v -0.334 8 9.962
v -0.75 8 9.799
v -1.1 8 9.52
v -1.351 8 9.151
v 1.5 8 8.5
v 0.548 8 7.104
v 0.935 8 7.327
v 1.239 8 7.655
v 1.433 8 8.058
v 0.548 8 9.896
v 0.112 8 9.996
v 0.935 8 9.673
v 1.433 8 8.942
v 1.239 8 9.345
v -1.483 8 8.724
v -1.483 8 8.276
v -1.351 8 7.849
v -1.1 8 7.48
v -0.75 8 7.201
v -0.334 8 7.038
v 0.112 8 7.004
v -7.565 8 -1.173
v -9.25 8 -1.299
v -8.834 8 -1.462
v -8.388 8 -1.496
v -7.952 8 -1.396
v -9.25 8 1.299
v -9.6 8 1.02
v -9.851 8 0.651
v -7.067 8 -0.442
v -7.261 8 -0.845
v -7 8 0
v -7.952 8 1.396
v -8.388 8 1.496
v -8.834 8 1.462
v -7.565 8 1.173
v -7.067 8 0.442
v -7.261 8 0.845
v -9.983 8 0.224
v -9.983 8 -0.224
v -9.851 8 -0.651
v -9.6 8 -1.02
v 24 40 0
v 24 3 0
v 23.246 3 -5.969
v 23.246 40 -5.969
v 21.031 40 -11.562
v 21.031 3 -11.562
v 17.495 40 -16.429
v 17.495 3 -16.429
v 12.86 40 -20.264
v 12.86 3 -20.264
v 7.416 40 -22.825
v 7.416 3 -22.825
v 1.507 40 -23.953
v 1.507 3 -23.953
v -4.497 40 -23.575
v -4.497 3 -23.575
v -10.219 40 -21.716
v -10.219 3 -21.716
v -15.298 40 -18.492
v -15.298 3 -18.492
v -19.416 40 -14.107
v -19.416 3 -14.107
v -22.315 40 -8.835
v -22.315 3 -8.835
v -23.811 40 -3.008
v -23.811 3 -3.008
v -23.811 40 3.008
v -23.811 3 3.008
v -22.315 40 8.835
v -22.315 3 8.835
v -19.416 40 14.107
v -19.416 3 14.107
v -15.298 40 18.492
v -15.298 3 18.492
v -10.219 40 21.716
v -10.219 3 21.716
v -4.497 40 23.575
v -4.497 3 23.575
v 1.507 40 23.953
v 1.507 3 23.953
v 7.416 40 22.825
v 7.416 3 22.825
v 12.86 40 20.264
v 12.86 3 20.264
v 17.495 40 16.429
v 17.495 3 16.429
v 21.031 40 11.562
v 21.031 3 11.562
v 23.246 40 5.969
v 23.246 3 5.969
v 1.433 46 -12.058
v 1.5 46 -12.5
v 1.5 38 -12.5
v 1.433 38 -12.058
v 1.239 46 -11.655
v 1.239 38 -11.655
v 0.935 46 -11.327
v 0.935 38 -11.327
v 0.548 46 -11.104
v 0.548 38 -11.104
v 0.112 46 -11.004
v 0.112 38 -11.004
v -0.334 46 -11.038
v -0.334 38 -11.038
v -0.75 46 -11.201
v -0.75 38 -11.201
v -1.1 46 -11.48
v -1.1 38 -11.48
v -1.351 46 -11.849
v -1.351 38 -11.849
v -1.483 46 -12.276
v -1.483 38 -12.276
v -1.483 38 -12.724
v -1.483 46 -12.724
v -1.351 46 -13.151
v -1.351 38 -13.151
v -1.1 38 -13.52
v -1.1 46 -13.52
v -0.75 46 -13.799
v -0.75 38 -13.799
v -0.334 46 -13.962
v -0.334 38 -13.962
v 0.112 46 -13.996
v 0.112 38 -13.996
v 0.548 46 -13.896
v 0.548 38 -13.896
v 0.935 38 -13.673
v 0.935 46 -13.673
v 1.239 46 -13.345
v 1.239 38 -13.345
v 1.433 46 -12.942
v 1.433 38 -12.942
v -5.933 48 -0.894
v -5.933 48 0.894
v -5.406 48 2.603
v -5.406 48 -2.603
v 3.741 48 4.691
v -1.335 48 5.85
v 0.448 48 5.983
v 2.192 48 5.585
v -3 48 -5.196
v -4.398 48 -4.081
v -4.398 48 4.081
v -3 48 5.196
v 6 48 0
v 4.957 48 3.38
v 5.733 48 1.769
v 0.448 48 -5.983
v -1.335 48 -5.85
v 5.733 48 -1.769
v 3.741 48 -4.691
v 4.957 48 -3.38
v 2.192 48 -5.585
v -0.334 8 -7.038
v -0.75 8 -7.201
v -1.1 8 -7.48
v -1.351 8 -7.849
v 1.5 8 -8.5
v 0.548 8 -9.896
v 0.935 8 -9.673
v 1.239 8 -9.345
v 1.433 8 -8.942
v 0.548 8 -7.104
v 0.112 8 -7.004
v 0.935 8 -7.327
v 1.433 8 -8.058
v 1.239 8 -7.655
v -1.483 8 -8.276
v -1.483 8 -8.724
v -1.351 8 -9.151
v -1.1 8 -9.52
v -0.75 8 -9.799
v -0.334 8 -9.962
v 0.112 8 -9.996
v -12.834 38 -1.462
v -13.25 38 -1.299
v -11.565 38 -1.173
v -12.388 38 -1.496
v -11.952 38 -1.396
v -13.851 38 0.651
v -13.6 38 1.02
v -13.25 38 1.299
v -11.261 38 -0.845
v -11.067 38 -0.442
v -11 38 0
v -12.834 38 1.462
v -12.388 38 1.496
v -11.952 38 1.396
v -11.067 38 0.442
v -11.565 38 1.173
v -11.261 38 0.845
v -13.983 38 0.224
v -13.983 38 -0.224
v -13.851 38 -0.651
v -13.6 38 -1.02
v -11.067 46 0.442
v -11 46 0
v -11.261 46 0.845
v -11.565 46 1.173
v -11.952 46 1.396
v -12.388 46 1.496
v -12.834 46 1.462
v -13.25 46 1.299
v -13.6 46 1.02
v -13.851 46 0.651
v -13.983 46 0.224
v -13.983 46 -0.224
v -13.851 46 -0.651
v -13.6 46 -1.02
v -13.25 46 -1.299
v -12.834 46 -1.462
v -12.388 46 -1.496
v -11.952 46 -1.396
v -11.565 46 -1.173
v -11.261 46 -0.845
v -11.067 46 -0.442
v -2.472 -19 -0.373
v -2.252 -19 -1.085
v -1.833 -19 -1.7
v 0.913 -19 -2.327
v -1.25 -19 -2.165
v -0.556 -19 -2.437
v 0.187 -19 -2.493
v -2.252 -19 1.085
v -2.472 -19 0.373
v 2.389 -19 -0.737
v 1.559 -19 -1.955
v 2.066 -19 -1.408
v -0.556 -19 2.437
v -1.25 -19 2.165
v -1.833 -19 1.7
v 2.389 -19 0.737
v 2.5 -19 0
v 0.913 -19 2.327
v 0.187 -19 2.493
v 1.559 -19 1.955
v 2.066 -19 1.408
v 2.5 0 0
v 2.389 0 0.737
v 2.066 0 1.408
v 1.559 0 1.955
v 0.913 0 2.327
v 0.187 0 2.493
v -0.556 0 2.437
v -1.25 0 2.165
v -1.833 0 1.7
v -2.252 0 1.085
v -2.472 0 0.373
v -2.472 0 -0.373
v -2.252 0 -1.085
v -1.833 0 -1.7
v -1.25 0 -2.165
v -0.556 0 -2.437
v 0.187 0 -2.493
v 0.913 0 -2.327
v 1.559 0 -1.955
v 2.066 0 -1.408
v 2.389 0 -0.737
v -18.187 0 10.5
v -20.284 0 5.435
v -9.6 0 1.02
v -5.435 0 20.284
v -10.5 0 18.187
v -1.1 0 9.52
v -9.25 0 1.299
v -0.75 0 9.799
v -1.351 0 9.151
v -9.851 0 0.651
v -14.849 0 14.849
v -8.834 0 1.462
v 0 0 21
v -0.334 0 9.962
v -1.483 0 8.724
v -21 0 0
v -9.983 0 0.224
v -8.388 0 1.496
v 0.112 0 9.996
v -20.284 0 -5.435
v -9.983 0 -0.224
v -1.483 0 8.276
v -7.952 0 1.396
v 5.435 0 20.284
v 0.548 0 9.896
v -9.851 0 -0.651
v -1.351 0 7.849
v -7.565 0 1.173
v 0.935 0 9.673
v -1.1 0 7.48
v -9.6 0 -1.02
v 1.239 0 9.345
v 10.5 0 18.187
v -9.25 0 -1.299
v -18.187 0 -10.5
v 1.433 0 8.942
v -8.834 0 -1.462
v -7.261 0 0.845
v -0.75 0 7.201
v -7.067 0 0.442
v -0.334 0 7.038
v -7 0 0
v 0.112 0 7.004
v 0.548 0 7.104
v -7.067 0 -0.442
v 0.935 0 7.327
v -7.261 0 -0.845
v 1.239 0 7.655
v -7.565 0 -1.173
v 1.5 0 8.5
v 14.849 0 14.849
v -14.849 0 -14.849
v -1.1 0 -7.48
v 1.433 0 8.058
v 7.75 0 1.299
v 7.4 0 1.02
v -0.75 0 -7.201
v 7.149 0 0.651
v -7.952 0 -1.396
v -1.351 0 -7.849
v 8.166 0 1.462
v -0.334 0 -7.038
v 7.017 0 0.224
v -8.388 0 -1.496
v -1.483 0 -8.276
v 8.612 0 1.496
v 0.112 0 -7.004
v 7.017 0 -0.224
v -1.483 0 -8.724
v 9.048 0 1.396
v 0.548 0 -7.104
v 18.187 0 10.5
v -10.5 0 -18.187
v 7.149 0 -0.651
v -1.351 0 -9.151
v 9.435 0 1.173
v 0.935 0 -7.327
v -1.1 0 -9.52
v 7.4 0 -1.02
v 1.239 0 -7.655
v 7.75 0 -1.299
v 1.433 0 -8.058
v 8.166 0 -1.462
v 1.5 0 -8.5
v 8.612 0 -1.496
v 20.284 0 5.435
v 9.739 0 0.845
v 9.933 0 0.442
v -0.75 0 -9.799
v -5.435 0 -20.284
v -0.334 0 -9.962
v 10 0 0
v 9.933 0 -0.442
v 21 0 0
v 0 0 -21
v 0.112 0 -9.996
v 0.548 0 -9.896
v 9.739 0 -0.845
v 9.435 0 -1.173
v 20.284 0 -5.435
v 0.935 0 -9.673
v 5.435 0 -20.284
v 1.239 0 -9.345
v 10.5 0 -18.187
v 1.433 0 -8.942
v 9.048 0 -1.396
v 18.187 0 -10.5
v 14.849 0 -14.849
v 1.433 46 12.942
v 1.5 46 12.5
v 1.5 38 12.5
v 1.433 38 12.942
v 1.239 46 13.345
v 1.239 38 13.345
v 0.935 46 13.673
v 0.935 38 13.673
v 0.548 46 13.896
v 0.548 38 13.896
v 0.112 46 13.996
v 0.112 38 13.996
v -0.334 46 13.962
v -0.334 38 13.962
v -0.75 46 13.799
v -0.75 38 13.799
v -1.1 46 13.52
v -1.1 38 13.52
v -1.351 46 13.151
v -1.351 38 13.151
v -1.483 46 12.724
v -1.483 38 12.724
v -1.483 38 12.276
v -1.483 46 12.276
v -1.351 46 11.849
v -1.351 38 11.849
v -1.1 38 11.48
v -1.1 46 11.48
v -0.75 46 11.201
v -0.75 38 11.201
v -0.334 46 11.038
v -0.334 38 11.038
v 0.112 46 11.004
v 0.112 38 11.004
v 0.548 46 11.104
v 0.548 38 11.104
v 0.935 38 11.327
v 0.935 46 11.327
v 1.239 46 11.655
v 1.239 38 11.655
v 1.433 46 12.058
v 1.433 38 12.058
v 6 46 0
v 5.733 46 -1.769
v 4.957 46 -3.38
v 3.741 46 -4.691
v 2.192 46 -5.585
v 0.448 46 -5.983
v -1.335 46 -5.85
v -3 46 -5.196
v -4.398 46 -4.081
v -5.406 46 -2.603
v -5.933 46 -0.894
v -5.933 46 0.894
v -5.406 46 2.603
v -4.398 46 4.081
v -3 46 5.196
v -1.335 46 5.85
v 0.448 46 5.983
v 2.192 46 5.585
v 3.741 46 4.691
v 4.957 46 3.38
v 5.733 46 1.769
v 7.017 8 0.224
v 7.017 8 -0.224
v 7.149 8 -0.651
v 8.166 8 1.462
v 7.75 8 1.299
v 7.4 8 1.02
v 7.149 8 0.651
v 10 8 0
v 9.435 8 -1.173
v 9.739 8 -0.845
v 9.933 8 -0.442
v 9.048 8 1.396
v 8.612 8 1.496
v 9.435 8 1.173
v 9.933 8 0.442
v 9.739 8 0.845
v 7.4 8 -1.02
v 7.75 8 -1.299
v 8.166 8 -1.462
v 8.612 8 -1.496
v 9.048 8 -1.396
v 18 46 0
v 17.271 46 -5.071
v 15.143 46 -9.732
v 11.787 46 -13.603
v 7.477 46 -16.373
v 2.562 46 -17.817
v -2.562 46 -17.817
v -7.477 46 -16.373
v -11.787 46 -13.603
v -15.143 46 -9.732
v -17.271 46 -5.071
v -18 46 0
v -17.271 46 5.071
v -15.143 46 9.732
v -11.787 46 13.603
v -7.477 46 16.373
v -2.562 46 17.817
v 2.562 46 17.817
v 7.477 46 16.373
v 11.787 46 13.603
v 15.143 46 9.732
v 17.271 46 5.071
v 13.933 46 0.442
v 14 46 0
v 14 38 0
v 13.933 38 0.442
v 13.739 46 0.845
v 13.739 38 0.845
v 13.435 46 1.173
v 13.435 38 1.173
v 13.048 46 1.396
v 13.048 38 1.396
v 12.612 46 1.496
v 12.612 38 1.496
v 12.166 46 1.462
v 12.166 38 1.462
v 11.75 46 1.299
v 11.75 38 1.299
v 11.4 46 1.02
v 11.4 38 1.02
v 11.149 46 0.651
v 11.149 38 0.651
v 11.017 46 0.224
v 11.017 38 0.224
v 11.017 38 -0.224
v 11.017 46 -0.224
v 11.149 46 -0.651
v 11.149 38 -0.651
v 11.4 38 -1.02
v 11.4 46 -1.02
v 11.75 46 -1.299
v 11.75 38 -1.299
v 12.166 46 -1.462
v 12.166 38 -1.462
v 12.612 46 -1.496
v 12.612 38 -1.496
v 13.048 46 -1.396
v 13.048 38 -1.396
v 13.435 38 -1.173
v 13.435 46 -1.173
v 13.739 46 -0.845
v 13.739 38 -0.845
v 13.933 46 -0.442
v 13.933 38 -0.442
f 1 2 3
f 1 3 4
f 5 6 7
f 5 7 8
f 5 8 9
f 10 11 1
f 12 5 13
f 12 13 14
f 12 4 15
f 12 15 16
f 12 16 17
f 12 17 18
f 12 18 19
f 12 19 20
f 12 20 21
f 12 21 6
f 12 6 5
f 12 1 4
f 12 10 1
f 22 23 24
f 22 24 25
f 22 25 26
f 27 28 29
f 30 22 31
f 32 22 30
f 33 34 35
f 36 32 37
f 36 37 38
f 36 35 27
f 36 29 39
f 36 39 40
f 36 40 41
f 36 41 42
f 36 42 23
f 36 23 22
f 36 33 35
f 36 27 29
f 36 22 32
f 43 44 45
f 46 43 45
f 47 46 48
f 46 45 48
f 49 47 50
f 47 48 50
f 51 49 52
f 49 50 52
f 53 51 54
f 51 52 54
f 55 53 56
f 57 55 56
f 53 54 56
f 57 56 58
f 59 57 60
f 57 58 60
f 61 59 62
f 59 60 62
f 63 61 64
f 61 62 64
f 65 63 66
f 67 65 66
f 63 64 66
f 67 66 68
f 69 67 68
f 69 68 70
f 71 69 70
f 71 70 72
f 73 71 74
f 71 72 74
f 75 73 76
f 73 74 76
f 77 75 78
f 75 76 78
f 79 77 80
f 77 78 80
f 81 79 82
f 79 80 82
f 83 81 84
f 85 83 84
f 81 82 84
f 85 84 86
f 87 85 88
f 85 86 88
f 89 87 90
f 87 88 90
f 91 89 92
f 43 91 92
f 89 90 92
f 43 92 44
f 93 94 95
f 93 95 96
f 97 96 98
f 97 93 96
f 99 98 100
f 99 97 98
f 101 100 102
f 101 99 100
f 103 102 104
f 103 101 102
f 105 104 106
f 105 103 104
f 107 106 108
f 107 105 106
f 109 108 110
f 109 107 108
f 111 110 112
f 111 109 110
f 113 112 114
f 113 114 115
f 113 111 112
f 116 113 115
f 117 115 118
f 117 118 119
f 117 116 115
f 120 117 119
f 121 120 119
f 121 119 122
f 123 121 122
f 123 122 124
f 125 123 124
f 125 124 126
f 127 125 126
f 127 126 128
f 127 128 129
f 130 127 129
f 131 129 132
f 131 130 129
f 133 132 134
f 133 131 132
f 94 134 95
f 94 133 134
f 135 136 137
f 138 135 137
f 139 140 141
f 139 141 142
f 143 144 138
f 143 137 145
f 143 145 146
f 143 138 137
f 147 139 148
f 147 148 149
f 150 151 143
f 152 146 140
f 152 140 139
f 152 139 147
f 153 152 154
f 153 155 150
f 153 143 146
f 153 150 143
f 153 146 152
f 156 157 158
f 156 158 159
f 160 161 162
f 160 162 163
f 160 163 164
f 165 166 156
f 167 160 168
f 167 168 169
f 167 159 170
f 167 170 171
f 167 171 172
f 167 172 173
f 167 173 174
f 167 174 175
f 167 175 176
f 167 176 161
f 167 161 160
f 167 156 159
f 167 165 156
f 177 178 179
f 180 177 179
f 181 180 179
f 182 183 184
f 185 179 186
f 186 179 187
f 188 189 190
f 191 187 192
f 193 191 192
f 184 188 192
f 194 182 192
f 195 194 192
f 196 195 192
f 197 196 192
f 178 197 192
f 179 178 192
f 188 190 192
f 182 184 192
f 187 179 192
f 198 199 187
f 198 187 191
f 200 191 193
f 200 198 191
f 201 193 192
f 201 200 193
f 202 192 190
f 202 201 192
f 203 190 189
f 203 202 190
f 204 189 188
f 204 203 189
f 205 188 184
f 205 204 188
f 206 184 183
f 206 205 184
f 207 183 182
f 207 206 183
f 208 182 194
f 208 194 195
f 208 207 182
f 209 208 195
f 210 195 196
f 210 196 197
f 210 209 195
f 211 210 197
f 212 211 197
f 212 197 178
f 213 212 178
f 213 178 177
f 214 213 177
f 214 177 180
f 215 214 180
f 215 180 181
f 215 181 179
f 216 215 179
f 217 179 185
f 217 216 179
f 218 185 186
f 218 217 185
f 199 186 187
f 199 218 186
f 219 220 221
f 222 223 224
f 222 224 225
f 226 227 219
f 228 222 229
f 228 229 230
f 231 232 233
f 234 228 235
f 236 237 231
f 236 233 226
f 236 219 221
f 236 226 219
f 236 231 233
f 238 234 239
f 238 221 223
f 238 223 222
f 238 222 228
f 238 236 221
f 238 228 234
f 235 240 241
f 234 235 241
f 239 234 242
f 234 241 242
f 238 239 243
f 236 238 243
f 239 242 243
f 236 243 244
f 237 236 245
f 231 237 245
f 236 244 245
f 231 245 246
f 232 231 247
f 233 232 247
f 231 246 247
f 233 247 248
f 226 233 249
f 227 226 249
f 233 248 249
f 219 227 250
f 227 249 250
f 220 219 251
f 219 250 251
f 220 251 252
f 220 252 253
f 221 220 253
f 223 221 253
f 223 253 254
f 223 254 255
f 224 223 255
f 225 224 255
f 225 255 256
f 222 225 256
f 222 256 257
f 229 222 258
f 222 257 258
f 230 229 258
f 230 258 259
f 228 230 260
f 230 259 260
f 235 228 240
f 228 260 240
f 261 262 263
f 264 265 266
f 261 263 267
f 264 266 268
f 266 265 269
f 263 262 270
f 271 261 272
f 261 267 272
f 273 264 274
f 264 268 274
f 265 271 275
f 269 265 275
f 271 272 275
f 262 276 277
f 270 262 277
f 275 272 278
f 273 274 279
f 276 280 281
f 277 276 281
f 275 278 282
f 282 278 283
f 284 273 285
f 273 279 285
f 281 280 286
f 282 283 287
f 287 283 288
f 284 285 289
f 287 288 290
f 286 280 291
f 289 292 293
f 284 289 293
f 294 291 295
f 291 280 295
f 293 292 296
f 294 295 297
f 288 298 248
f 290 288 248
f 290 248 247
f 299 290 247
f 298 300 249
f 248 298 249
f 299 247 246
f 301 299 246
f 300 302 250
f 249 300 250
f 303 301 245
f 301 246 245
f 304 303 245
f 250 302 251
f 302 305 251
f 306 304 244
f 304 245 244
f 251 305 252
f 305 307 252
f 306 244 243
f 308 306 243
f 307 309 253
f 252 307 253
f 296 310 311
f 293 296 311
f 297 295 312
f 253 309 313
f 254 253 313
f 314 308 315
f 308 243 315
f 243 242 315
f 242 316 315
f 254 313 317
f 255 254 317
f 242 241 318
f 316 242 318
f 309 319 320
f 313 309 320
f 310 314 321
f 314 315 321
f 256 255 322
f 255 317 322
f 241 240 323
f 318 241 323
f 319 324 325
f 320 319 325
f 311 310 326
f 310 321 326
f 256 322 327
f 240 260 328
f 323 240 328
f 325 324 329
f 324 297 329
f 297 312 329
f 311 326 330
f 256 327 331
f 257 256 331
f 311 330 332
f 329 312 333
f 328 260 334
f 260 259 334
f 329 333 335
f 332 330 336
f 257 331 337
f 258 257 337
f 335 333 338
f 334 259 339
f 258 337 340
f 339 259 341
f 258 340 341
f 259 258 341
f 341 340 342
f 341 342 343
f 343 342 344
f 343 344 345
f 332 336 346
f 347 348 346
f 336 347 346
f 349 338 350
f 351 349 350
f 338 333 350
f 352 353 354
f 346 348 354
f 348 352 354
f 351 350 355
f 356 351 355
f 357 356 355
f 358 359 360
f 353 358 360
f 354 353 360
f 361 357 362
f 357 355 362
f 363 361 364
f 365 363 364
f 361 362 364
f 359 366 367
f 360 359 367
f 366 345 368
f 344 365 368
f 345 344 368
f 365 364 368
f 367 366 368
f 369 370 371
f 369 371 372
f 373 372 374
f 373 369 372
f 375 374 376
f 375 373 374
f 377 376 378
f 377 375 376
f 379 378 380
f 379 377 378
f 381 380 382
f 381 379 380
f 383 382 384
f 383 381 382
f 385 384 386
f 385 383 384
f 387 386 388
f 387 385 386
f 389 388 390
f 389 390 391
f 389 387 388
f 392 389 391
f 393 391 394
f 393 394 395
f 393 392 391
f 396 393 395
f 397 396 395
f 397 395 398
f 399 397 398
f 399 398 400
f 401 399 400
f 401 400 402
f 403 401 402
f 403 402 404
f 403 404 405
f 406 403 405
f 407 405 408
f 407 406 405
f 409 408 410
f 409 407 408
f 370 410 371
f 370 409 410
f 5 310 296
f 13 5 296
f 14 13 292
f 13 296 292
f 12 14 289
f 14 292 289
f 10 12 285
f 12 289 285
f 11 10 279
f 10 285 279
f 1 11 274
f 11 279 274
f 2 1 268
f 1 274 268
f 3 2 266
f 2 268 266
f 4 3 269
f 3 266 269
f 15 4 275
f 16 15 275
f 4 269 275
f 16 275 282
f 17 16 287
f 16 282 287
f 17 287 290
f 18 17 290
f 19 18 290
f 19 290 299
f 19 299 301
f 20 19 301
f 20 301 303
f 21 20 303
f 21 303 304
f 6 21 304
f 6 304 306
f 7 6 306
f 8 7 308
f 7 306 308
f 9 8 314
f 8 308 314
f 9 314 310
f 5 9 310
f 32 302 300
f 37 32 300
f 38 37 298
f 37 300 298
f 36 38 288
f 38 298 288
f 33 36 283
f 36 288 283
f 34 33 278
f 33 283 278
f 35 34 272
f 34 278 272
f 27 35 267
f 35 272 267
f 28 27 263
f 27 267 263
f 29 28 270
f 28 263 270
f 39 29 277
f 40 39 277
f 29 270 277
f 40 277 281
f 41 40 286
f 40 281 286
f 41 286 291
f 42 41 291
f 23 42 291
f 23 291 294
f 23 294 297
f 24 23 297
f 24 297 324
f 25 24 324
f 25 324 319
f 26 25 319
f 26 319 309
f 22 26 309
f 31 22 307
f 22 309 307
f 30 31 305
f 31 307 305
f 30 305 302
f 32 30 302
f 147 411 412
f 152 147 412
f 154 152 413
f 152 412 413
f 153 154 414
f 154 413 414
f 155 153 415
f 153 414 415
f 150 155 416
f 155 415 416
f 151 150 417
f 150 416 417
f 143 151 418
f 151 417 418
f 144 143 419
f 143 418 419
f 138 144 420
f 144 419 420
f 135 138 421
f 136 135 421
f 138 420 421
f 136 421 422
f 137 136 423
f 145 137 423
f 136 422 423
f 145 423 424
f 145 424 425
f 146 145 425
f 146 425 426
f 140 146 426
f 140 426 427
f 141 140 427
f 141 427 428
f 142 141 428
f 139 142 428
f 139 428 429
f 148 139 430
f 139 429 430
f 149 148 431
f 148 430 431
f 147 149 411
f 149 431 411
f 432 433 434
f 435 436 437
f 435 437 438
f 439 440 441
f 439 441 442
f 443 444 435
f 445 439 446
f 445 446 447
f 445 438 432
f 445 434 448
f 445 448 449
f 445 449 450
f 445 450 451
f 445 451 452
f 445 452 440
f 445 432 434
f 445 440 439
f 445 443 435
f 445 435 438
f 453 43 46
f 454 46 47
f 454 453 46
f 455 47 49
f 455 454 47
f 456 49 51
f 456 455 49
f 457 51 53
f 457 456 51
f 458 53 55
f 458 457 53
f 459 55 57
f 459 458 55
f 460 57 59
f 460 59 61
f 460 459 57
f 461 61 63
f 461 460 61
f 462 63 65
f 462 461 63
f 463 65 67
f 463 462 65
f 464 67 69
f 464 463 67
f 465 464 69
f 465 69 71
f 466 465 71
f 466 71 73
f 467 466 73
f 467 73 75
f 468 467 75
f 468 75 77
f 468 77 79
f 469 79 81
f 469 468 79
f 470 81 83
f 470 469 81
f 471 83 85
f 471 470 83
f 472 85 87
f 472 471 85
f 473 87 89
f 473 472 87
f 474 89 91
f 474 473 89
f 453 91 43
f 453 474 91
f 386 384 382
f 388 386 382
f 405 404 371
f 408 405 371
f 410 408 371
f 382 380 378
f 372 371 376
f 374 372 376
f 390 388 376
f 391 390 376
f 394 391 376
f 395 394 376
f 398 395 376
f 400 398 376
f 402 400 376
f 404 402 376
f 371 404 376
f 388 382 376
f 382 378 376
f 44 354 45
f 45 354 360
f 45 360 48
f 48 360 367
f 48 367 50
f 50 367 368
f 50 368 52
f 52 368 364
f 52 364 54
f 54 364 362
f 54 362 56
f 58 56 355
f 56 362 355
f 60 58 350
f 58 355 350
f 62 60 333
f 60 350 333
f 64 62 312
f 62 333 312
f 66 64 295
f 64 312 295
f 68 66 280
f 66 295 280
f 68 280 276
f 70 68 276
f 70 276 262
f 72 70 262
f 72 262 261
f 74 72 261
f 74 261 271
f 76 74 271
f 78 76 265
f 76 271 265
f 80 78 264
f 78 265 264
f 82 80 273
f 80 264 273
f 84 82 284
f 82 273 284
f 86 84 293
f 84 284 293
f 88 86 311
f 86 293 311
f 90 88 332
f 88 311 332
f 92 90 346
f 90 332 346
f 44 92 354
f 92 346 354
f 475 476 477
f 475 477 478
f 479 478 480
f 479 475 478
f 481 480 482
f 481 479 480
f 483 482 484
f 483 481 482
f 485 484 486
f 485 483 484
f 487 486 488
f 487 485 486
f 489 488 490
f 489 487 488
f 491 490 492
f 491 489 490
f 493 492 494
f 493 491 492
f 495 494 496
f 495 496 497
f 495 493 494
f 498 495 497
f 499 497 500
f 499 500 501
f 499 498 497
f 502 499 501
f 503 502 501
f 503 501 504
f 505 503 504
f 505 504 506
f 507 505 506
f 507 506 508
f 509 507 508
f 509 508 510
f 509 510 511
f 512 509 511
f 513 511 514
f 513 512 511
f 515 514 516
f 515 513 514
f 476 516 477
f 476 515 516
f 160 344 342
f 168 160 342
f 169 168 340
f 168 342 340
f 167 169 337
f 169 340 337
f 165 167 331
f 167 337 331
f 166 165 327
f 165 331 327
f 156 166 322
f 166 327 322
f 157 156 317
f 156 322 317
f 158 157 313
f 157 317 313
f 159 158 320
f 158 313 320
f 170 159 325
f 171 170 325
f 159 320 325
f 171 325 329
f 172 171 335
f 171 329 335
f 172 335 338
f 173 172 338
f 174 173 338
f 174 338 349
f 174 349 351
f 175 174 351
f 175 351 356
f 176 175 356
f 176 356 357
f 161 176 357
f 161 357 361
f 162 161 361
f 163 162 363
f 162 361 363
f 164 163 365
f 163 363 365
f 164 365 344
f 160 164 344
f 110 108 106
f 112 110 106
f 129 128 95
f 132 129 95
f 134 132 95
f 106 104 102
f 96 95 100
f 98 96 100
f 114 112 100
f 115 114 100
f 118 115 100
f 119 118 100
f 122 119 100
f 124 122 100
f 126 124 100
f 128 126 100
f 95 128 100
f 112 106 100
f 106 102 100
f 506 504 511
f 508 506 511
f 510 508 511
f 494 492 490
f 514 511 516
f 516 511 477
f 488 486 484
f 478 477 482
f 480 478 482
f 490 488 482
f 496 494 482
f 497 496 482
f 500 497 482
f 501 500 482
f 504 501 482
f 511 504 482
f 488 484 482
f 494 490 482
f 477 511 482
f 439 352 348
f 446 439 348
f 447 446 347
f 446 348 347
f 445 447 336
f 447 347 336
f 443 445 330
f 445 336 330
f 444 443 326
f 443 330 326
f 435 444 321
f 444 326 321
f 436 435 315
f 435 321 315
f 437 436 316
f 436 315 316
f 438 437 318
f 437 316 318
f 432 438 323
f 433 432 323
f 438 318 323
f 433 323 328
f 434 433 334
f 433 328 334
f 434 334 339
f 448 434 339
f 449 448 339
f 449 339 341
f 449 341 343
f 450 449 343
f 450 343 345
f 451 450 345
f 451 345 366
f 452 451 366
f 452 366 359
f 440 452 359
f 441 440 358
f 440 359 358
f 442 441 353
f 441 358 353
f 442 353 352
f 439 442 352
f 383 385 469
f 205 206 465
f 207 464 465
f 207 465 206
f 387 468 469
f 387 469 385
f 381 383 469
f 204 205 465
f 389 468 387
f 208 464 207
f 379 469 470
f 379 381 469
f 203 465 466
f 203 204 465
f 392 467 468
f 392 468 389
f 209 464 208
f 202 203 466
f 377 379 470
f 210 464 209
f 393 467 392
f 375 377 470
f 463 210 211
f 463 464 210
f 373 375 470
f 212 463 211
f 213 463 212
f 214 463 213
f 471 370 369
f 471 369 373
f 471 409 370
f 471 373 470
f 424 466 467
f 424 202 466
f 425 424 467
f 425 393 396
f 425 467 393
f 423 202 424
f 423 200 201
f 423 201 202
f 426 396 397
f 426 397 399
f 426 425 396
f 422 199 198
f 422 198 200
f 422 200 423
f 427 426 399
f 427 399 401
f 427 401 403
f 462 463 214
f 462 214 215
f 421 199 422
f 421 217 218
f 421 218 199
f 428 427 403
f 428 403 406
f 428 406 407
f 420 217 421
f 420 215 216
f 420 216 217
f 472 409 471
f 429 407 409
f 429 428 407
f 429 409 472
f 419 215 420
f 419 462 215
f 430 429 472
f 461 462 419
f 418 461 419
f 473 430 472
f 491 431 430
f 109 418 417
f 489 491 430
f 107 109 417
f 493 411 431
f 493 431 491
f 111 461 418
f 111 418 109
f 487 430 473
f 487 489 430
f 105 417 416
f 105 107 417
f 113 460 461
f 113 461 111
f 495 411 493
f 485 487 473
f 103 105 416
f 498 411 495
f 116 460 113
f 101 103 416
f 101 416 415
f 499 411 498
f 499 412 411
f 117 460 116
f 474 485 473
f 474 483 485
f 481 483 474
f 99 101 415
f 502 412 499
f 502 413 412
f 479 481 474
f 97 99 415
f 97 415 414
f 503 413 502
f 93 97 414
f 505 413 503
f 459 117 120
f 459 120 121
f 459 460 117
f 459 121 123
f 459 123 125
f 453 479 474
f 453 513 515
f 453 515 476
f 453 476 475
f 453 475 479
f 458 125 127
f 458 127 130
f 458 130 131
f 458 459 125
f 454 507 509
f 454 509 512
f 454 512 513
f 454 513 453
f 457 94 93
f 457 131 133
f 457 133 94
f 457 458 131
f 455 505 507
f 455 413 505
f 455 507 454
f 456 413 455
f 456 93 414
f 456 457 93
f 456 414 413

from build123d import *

# Parameters (mm, degrees)
SKETCH_1_R          = 24
EXTRUDE_1_DEPTH     = 46
SKETCH_3_R          = 6
EXTRUDE_2_DEPTH     = 2
CHAMFER_1_SIZE      = 6
CHAMFER_2_SIZE      = 3
SKETCH_4_R          = 1.5
CUT_EXTRUDE_1_DEPTH = 8
SKETCH_5_R          = 1.5
CUT_EXTRUDE_2_DEPTH = 8
SKETCH_6_R          = 2.5
EXTRUDE_3_DEPTH     = 19


with BuildPart() as part:
    # 草图1 → 凸台-拉伸1 (new body)
    with BuildSketch(Plane(origin=(0, 0, 0), x_dir=(1, 0, 0), z_dir=(0, 1, 0))):
        Circle(SKETCH_1_R)
    extrude(amount=EXTRUDE_1_DEPTH)

    # 草图3 → 凸台-拉伸2 (add)
    with BuildSketch(Plane(origin=(0, 46, 0), x_dir=(1, 0, 0), z_dir=(0, 1, 0))):
        Circle(SKETCH_3_R)
    extrude(amount=EXTRUDE_2_DEPTH)

    # 倒角1
    chamfer_1_edges = [part.edges().sort_by_distance(p)[0] for p in [
        (-24, 46, 0),
    ]]
    chamfer(chamfer_1_edges, length=CHAMFER_1_SIZE)

    # 倒角2
    chamfer_2_edges = [part.edges().sort_by_distance(p)[0] for p in [
        (-24, 0, 0),
    ]]
    chamfer(chamfer_2_edges, length=CHAMFER_2_SIZE)

    # 草图4 → 切除-拉伸1 (cut)
    with BuildSketch(Plane.XZ.offset(-46)):
        with Locations((0, 12.5)):
            Circle(SKETCH_4_R)
        with Locations((-12.5, 0)):
            Circle(SKETCH_4_R)
        with Locations((12.5, 0)):
            Circle(SKETCH_4_R)
        with Locations((0, -12.5)):
            Circle(SKETCH_4_R)
    extrude(amount=CUT_EXTRUDE_1_DEPTH, mode=Mode.SUBTRACT)

    # 草图5 → 切除-拉伸2 (cut)
    with BuildSketch(Plane.XZ):
        with Locations((0, 8.5)):
            Circle(SKETCH_5_R)
        with Locations((8.5, 0)):
            Circle(SKETCH_5_R)
        with Locations((0, -8.5)):
            Circle(SKETCH_5_R)
        with Locations((-8.5, 0)):
            Circle(SKETCH_5_R)
    extrude(amount=-CUT_EXTRUDE_2_DEPTH, mode=Mode.SUBTRACT)

    # 草图6 → 凸台-拉伸3 (add)
    with BuildSketch(Plane.XZ):
        Circle(SKETCH_6_R)
    extrude(amount=EXTRUDE_3_DEPTH)


solid = part.part
